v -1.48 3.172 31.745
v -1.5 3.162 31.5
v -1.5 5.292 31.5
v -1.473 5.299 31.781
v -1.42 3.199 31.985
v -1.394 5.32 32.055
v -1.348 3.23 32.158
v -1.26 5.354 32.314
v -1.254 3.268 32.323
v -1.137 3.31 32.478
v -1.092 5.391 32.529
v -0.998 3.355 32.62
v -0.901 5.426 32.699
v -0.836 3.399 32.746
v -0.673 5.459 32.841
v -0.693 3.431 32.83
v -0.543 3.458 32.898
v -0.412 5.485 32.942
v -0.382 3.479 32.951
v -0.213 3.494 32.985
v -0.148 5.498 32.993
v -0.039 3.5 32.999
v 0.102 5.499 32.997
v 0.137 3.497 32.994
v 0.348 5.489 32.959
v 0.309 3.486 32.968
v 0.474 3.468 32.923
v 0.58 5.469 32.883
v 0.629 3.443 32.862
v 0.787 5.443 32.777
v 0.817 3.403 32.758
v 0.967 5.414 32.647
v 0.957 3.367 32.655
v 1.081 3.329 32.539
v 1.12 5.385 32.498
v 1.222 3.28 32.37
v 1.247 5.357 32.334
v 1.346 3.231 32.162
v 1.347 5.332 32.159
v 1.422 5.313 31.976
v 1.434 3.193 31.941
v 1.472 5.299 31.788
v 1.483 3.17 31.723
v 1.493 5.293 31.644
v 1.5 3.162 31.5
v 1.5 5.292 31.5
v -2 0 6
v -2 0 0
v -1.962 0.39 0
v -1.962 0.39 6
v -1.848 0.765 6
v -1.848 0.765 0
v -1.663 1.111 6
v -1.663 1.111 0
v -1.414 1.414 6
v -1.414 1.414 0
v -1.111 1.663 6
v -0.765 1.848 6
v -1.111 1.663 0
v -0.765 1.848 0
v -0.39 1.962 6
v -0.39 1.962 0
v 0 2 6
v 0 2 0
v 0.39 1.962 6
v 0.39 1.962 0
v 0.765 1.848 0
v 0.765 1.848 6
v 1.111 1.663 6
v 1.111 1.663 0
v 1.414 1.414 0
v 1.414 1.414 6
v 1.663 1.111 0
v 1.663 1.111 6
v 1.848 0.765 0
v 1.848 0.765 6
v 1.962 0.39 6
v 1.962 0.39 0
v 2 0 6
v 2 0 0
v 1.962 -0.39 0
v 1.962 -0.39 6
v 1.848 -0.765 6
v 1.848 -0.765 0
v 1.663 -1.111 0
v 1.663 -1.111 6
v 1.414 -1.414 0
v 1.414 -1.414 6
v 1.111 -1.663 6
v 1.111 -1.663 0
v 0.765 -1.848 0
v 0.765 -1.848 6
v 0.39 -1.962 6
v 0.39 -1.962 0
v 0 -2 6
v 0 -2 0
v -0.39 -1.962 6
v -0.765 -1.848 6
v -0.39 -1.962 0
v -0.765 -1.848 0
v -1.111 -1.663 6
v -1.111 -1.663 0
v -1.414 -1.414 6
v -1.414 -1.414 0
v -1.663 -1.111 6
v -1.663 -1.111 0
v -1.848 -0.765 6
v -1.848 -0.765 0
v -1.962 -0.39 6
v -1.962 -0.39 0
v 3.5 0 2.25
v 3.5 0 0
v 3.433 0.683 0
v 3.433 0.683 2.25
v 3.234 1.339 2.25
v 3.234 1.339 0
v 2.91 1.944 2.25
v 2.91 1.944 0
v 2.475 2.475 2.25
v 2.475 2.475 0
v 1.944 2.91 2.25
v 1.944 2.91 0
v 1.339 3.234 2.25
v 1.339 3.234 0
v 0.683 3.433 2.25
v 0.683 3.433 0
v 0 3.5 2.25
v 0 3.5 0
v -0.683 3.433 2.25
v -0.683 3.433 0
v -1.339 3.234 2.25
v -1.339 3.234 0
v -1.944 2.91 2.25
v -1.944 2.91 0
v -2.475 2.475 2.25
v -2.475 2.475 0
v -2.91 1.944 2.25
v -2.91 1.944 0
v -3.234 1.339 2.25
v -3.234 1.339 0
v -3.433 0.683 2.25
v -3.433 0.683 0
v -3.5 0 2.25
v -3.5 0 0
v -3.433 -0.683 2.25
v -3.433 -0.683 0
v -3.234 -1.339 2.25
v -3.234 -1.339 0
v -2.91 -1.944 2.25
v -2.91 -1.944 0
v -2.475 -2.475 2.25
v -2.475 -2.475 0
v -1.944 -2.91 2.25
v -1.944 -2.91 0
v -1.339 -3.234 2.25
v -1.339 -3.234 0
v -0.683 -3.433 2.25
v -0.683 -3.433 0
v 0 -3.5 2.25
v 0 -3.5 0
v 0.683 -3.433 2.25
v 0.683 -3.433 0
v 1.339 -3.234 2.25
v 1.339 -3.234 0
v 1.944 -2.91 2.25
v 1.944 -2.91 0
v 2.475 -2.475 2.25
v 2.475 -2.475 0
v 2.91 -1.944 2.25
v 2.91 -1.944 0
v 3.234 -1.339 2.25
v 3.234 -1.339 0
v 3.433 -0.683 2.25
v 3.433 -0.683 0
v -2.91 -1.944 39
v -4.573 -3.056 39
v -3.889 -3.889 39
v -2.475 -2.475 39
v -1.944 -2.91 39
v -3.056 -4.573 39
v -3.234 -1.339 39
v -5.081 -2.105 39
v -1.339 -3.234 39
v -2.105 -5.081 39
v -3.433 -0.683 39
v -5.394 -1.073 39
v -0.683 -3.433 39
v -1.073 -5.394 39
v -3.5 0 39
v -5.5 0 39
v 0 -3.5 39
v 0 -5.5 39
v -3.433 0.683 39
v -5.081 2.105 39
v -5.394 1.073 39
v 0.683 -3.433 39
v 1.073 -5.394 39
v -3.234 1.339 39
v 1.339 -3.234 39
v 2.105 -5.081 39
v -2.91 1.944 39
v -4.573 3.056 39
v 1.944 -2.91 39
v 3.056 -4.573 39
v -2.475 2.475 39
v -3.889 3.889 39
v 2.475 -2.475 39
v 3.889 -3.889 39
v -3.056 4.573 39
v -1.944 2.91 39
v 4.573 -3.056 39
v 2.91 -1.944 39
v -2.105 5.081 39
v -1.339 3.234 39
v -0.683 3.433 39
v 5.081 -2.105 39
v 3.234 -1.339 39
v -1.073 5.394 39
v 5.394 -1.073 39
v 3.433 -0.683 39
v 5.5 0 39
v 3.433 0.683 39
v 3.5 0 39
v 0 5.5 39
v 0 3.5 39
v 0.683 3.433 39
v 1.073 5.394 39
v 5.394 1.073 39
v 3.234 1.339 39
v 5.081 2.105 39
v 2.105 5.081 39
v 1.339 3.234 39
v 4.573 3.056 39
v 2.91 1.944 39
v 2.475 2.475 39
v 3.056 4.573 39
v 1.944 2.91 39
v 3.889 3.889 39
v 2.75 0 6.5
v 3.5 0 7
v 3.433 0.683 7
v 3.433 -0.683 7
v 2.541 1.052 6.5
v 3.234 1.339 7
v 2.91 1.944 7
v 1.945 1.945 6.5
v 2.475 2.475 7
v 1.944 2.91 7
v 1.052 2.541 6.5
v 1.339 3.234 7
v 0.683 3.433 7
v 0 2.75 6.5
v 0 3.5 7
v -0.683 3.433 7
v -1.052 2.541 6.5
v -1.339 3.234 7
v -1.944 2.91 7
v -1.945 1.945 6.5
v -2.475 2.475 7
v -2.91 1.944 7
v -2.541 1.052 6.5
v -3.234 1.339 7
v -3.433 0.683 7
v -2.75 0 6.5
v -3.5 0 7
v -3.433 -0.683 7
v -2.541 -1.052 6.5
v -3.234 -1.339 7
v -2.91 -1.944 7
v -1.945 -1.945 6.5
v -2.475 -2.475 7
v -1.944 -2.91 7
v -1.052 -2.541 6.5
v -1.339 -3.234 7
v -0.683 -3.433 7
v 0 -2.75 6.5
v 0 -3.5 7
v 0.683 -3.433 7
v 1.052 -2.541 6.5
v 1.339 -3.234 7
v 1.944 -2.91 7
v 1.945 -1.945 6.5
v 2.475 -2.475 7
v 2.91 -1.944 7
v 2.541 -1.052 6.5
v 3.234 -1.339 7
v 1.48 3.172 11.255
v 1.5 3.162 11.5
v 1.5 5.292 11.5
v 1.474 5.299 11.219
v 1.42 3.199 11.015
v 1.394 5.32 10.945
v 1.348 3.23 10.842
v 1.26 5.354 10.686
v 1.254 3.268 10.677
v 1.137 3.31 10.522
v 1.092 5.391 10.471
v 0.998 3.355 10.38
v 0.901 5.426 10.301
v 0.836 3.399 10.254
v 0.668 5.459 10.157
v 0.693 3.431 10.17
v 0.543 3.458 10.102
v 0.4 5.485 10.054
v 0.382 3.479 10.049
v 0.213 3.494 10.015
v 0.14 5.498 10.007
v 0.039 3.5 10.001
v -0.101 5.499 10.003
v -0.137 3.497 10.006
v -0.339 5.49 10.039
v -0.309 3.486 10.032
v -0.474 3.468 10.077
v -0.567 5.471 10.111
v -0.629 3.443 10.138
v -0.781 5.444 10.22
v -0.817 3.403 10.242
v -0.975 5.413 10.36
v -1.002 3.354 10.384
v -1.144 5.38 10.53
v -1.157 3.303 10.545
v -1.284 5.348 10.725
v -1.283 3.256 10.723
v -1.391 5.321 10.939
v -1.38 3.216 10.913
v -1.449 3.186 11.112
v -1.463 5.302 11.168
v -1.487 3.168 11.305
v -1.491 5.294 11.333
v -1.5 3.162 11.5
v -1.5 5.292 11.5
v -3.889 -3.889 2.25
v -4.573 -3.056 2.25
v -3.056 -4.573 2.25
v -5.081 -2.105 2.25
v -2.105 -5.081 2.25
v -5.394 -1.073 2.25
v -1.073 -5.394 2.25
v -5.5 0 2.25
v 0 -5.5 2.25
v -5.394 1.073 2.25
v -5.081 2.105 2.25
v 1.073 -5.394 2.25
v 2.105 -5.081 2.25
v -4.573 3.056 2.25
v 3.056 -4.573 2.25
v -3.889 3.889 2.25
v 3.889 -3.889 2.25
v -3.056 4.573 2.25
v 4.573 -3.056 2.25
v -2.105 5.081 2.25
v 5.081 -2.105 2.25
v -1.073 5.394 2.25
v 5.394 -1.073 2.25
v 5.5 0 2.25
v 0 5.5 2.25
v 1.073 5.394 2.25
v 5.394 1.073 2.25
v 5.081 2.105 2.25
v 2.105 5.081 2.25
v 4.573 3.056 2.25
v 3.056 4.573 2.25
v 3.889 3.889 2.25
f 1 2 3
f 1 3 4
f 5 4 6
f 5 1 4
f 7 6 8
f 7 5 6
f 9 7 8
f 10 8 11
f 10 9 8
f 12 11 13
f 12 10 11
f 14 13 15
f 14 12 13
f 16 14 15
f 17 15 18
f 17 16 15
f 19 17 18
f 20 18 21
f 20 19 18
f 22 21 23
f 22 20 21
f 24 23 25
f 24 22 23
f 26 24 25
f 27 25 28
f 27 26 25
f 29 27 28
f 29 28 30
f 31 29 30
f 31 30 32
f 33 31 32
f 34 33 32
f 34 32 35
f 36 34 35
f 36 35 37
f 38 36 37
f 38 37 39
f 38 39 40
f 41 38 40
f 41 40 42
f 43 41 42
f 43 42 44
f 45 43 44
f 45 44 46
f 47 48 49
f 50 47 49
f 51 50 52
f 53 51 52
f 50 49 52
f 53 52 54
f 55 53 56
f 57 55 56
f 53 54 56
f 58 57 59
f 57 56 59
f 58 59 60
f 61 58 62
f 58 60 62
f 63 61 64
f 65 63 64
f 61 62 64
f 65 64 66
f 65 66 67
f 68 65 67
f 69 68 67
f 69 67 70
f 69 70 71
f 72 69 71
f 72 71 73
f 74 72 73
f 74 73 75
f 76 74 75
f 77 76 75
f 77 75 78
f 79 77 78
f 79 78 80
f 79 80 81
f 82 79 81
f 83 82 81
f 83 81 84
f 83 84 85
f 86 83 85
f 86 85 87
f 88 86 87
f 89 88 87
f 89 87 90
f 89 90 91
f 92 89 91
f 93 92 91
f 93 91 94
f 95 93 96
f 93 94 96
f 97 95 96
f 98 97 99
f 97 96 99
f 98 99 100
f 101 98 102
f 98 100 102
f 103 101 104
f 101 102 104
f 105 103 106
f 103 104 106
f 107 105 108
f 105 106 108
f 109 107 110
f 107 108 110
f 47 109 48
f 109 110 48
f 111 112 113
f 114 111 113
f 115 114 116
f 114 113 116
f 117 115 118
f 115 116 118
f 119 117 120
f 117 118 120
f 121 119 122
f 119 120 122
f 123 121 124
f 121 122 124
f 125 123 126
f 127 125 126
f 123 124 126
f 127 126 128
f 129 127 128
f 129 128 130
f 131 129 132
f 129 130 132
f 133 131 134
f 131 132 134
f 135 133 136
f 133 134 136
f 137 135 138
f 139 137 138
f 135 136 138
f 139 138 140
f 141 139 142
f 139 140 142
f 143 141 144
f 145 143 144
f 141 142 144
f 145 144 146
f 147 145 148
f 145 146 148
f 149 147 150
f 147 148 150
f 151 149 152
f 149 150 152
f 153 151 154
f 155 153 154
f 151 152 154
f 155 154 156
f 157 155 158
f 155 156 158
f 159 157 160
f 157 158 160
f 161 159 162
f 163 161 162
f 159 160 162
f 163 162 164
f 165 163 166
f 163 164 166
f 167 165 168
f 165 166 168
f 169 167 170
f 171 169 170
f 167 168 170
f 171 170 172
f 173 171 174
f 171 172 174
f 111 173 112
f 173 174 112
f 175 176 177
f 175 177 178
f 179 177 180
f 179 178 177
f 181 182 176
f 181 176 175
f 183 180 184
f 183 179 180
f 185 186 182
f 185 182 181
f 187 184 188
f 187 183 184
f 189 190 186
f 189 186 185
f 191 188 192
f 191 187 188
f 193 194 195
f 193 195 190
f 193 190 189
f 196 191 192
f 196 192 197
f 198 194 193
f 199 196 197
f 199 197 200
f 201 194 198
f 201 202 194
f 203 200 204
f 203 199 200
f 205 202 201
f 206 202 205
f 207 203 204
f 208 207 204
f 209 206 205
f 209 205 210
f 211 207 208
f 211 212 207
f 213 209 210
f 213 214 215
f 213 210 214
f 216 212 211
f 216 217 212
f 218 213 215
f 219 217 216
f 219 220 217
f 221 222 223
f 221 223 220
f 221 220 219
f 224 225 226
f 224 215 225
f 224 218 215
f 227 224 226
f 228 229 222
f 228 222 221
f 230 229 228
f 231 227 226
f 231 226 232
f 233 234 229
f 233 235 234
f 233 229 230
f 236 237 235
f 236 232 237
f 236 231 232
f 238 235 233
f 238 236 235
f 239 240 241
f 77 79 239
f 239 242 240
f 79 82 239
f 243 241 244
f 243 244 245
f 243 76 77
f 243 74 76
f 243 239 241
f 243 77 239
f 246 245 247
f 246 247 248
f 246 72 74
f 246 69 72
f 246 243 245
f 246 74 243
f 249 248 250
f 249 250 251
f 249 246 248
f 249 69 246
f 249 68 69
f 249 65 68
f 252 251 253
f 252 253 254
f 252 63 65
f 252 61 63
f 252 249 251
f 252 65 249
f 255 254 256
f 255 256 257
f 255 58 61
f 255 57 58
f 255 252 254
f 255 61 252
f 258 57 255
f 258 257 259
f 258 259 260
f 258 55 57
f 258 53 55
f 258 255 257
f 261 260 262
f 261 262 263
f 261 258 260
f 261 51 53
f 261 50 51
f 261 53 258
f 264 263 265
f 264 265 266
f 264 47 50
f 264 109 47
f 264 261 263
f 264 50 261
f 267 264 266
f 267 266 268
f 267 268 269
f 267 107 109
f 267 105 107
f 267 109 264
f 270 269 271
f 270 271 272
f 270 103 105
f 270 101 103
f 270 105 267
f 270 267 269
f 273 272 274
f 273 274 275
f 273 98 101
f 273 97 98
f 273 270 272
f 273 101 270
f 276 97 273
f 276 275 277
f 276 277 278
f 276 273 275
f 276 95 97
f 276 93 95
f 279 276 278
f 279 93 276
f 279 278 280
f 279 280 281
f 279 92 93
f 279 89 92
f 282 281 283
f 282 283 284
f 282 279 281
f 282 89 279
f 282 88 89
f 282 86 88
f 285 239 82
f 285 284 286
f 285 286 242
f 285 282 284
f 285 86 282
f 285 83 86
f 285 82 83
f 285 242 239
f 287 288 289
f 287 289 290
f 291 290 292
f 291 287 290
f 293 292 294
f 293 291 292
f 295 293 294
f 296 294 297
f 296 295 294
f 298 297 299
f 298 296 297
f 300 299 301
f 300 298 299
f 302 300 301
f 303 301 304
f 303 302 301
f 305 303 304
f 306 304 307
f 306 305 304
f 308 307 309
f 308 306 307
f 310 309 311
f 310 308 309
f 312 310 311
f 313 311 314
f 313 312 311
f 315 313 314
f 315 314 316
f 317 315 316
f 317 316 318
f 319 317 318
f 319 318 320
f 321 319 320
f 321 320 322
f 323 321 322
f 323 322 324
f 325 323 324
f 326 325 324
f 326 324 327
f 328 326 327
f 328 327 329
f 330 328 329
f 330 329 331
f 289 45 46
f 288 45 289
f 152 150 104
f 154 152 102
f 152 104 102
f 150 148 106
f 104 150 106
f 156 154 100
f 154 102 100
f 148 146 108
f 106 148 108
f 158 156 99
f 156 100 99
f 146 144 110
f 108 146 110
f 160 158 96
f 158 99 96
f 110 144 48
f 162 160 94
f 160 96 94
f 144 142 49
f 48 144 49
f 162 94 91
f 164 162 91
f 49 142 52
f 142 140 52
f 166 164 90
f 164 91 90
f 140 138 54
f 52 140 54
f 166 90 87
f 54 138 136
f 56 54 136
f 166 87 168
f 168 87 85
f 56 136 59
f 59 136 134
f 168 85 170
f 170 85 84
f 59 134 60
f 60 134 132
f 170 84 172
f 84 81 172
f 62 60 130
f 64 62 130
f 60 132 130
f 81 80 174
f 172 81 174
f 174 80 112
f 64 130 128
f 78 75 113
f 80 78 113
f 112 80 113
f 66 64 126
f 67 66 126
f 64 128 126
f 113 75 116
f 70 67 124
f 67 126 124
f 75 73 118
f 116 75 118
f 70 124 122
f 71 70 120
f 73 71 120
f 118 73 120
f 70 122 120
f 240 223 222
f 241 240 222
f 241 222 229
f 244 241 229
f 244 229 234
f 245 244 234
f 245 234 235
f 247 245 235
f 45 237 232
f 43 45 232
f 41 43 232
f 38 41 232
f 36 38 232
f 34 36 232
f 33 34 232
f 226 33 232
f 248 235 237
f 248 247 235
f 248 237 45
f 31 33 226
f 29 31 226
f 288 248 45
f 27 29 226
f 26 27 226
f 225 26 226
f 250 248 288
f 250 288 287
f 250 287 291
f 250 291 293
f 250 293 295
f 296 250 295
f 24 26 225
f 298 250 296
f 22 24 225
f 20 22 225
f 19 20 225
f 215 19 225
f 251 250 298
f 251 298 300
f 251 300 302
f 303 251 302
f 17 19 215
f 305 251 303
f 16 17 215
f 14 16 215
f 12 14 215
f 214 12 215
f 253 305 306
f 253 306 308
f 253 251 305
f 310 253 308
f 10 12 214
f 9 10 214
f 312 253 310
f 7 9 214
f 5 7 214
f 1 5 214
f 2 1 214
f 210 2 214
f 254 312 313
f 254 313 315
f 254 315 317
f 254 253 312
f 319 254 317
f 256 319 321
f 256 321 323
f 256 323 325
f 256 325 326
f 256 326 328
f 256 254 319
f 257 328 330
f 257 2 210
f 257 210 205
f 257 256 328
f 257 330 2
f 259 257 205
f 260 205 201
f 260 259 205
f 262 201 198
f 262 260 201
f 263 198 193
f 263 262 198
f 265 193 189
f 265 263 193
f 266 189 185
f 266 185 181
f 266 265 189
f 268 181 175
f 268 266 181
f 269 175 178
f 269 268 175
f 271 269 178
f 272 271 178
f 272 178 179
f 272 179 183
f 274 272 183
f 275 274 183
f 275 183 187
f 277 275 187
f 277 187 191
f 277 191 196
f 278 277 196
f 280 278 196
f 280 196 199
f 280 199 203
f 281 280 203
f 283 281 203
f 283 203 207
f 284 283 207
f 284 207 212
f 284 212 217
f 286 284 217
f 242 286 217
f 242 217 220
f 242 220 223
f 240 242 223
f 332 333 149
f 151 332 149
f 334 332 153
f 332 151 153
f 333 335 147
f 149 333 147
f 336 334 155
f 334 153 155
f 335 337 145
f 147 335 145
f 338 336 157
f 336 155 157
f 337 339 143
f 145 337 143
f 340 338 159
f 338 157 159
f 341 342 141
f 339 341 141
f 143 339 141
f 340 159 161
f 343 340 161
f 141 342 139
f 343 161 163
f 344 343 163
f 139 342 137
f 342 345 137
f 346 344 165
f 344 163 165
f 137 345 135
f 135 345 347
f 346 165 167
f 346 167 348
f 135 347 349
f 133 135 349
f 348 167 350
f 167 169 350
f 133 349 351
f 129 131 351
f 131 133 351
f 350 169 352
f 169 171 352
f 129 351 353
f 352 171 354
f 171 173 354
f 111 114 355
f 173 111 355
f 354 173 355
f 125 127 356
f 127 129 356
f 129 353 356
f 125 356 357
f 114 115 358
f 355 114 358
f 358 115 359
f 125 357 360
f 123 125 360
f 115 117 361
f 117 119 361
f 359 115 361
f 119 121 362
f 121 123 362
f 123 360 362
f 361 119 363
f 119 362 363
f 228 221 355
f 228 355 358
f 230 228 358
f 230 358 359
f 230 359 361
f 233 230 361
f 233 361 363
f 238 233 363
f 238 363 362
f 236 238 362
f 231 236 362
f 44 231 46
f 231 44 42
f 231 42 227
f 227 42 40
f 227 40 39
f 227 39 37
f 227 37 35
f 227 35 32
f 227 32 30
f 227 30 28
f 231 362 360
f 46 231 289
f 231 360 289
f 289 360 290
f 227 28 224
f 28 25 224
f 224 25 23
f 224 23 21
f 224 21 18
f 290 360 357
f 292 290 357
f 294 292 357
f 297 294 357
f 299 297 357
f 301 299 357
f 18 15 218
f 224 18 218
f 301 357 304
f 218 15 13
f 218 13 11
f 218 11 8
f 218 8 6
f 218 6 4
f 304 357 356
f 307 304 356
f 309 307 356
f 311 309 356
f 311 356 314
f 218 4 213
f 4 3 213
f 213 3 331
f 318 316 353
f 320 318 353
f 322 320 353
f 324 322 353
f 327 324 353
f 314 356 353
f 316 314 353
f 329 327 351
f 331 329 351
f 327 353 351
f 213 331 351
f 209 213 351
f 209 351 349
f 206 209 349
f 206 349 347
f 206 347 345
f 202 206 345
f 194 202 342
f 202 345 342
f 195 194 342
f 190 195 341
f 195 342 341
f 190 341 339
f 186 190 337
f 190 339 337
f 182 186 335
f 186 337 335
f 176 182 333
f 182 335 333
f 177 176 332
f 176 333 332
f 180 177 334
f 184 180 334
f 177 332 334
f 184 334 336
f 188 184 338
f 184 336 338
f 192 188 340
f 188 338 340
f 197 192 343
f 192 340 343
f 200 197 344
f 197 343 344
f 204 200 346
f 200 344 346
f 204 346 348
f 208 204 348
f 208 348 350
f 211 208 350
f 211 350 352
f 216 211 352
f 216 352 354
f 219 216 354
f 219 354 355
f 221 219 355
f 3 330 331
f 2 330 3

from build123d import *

# Parameters (mm, degrees)
SKETCH1_R           = 3.5
BOSS_EXTRUDE1_DEPTH = 2.25
SKETCH2_R           = 5.5
BOSS_EXTRUDE2_DEPTH = 36.75
CUT_EXTRUDE1_START  = -33
SKETCH3_R           = 3.5
CUT_EXTRUDE1_DEPTH  = 33
CUT_EXTRUDE2_REACH  = 41.768
SKETCH4_R           = 2
CHAMFER1_SIZE2      = 1.5
CHAMFER1_SIZE       = 1
CUT_EXTRUDE3_DEPTH  = 40.76807765


with BuildPart() as part:
    # Sketch1 → Boss-Extrude1 (new body)
    with BuildSketch(Plane.XY):
        Circle(SKETCH1_R)
    extrude(amount=BOSS_EXTRUDE1_DEPTH)

    # Sketch2 → Boss-Extrude2 (add)
    with BuildSketch(Plane.XY.offset(2.25)):
        Circle(SKETCH2_R)
    extrude(amount=BOSS_EXTRUDE2_DEPTH)

    # Sketch3 → Cut-Extrude1 (cut)
    with BuildSketch(Plane.XY.offset(39).offset(CUT_EXTRUDE1_START)):
        Circle(SKETCH3_R)
    extrude(amount=CUT_EXTRUDE1_DEPTH, mode=Mode.SUBTRACT)

    # Sketch4 → Cut-Extrude2 (cut, up to next)
    with BuildSketch(Plane(origin=(0, 0, 0), x_dir=(-1, 0, 0), z_dir=(0, 0, -1)), mode=Mode.PRIVATE) as cut_extrude2_sk1:
        Circle(SKETCH4_R)
    cut_extrude2_tool1 = extrude(cut_extrude2_sk1.sketch, amount=-CUT_EXTRUDE2_REACH, mode=Mode.PRIVATE) & part.part
    add(cut_extrude2_tool1.solids().sort_by_distance((0, 0, 0))[0], mode=Mode.SUBTRACT)

    # Chamfer1
    chamfer1_edges = [part.edges().sort_by_distance(p)[0] for p in [
        (-3.5, 0, 6),
    ]]
    chamfer1_side = [part.faces().sort_by_distance(p)[0] for p in [
        (-3.5, 0, 6.02),
    ]]
    chamfer(chamfer1_edges, length=CHAMFER1_SIZE - 0.0001, length2=CHAMFER1_SIZE2 - 0.0001, reference=chamfer1_side[0])  # a hair under: the kernel refuses the full size

    # Sketch5 → Cut-Extrude3 (cut, through all)
    with BuildSketch(Plane(origin=(0, 0, 0), x_dir=(1, 0, 0), z_dir=(0, 1, 0))):
        with BuildLine():
            Line((-1.5, -11.5), (-1.5, -31.5))
            ThreePointArc((-1.5, -31.5), (0, -33), (1.5, -31.5))
            Line((1.5, -31.5), (1.5, -11.5))
            ThreePointArc((1.5, -11.5), (0, -10), (-1.5, -11.5))
        make_face()
    extrude(amount=CUT_EXTRUDE3_DEPTH, mode=Mode.SUBTRACT)


solid = part.part
